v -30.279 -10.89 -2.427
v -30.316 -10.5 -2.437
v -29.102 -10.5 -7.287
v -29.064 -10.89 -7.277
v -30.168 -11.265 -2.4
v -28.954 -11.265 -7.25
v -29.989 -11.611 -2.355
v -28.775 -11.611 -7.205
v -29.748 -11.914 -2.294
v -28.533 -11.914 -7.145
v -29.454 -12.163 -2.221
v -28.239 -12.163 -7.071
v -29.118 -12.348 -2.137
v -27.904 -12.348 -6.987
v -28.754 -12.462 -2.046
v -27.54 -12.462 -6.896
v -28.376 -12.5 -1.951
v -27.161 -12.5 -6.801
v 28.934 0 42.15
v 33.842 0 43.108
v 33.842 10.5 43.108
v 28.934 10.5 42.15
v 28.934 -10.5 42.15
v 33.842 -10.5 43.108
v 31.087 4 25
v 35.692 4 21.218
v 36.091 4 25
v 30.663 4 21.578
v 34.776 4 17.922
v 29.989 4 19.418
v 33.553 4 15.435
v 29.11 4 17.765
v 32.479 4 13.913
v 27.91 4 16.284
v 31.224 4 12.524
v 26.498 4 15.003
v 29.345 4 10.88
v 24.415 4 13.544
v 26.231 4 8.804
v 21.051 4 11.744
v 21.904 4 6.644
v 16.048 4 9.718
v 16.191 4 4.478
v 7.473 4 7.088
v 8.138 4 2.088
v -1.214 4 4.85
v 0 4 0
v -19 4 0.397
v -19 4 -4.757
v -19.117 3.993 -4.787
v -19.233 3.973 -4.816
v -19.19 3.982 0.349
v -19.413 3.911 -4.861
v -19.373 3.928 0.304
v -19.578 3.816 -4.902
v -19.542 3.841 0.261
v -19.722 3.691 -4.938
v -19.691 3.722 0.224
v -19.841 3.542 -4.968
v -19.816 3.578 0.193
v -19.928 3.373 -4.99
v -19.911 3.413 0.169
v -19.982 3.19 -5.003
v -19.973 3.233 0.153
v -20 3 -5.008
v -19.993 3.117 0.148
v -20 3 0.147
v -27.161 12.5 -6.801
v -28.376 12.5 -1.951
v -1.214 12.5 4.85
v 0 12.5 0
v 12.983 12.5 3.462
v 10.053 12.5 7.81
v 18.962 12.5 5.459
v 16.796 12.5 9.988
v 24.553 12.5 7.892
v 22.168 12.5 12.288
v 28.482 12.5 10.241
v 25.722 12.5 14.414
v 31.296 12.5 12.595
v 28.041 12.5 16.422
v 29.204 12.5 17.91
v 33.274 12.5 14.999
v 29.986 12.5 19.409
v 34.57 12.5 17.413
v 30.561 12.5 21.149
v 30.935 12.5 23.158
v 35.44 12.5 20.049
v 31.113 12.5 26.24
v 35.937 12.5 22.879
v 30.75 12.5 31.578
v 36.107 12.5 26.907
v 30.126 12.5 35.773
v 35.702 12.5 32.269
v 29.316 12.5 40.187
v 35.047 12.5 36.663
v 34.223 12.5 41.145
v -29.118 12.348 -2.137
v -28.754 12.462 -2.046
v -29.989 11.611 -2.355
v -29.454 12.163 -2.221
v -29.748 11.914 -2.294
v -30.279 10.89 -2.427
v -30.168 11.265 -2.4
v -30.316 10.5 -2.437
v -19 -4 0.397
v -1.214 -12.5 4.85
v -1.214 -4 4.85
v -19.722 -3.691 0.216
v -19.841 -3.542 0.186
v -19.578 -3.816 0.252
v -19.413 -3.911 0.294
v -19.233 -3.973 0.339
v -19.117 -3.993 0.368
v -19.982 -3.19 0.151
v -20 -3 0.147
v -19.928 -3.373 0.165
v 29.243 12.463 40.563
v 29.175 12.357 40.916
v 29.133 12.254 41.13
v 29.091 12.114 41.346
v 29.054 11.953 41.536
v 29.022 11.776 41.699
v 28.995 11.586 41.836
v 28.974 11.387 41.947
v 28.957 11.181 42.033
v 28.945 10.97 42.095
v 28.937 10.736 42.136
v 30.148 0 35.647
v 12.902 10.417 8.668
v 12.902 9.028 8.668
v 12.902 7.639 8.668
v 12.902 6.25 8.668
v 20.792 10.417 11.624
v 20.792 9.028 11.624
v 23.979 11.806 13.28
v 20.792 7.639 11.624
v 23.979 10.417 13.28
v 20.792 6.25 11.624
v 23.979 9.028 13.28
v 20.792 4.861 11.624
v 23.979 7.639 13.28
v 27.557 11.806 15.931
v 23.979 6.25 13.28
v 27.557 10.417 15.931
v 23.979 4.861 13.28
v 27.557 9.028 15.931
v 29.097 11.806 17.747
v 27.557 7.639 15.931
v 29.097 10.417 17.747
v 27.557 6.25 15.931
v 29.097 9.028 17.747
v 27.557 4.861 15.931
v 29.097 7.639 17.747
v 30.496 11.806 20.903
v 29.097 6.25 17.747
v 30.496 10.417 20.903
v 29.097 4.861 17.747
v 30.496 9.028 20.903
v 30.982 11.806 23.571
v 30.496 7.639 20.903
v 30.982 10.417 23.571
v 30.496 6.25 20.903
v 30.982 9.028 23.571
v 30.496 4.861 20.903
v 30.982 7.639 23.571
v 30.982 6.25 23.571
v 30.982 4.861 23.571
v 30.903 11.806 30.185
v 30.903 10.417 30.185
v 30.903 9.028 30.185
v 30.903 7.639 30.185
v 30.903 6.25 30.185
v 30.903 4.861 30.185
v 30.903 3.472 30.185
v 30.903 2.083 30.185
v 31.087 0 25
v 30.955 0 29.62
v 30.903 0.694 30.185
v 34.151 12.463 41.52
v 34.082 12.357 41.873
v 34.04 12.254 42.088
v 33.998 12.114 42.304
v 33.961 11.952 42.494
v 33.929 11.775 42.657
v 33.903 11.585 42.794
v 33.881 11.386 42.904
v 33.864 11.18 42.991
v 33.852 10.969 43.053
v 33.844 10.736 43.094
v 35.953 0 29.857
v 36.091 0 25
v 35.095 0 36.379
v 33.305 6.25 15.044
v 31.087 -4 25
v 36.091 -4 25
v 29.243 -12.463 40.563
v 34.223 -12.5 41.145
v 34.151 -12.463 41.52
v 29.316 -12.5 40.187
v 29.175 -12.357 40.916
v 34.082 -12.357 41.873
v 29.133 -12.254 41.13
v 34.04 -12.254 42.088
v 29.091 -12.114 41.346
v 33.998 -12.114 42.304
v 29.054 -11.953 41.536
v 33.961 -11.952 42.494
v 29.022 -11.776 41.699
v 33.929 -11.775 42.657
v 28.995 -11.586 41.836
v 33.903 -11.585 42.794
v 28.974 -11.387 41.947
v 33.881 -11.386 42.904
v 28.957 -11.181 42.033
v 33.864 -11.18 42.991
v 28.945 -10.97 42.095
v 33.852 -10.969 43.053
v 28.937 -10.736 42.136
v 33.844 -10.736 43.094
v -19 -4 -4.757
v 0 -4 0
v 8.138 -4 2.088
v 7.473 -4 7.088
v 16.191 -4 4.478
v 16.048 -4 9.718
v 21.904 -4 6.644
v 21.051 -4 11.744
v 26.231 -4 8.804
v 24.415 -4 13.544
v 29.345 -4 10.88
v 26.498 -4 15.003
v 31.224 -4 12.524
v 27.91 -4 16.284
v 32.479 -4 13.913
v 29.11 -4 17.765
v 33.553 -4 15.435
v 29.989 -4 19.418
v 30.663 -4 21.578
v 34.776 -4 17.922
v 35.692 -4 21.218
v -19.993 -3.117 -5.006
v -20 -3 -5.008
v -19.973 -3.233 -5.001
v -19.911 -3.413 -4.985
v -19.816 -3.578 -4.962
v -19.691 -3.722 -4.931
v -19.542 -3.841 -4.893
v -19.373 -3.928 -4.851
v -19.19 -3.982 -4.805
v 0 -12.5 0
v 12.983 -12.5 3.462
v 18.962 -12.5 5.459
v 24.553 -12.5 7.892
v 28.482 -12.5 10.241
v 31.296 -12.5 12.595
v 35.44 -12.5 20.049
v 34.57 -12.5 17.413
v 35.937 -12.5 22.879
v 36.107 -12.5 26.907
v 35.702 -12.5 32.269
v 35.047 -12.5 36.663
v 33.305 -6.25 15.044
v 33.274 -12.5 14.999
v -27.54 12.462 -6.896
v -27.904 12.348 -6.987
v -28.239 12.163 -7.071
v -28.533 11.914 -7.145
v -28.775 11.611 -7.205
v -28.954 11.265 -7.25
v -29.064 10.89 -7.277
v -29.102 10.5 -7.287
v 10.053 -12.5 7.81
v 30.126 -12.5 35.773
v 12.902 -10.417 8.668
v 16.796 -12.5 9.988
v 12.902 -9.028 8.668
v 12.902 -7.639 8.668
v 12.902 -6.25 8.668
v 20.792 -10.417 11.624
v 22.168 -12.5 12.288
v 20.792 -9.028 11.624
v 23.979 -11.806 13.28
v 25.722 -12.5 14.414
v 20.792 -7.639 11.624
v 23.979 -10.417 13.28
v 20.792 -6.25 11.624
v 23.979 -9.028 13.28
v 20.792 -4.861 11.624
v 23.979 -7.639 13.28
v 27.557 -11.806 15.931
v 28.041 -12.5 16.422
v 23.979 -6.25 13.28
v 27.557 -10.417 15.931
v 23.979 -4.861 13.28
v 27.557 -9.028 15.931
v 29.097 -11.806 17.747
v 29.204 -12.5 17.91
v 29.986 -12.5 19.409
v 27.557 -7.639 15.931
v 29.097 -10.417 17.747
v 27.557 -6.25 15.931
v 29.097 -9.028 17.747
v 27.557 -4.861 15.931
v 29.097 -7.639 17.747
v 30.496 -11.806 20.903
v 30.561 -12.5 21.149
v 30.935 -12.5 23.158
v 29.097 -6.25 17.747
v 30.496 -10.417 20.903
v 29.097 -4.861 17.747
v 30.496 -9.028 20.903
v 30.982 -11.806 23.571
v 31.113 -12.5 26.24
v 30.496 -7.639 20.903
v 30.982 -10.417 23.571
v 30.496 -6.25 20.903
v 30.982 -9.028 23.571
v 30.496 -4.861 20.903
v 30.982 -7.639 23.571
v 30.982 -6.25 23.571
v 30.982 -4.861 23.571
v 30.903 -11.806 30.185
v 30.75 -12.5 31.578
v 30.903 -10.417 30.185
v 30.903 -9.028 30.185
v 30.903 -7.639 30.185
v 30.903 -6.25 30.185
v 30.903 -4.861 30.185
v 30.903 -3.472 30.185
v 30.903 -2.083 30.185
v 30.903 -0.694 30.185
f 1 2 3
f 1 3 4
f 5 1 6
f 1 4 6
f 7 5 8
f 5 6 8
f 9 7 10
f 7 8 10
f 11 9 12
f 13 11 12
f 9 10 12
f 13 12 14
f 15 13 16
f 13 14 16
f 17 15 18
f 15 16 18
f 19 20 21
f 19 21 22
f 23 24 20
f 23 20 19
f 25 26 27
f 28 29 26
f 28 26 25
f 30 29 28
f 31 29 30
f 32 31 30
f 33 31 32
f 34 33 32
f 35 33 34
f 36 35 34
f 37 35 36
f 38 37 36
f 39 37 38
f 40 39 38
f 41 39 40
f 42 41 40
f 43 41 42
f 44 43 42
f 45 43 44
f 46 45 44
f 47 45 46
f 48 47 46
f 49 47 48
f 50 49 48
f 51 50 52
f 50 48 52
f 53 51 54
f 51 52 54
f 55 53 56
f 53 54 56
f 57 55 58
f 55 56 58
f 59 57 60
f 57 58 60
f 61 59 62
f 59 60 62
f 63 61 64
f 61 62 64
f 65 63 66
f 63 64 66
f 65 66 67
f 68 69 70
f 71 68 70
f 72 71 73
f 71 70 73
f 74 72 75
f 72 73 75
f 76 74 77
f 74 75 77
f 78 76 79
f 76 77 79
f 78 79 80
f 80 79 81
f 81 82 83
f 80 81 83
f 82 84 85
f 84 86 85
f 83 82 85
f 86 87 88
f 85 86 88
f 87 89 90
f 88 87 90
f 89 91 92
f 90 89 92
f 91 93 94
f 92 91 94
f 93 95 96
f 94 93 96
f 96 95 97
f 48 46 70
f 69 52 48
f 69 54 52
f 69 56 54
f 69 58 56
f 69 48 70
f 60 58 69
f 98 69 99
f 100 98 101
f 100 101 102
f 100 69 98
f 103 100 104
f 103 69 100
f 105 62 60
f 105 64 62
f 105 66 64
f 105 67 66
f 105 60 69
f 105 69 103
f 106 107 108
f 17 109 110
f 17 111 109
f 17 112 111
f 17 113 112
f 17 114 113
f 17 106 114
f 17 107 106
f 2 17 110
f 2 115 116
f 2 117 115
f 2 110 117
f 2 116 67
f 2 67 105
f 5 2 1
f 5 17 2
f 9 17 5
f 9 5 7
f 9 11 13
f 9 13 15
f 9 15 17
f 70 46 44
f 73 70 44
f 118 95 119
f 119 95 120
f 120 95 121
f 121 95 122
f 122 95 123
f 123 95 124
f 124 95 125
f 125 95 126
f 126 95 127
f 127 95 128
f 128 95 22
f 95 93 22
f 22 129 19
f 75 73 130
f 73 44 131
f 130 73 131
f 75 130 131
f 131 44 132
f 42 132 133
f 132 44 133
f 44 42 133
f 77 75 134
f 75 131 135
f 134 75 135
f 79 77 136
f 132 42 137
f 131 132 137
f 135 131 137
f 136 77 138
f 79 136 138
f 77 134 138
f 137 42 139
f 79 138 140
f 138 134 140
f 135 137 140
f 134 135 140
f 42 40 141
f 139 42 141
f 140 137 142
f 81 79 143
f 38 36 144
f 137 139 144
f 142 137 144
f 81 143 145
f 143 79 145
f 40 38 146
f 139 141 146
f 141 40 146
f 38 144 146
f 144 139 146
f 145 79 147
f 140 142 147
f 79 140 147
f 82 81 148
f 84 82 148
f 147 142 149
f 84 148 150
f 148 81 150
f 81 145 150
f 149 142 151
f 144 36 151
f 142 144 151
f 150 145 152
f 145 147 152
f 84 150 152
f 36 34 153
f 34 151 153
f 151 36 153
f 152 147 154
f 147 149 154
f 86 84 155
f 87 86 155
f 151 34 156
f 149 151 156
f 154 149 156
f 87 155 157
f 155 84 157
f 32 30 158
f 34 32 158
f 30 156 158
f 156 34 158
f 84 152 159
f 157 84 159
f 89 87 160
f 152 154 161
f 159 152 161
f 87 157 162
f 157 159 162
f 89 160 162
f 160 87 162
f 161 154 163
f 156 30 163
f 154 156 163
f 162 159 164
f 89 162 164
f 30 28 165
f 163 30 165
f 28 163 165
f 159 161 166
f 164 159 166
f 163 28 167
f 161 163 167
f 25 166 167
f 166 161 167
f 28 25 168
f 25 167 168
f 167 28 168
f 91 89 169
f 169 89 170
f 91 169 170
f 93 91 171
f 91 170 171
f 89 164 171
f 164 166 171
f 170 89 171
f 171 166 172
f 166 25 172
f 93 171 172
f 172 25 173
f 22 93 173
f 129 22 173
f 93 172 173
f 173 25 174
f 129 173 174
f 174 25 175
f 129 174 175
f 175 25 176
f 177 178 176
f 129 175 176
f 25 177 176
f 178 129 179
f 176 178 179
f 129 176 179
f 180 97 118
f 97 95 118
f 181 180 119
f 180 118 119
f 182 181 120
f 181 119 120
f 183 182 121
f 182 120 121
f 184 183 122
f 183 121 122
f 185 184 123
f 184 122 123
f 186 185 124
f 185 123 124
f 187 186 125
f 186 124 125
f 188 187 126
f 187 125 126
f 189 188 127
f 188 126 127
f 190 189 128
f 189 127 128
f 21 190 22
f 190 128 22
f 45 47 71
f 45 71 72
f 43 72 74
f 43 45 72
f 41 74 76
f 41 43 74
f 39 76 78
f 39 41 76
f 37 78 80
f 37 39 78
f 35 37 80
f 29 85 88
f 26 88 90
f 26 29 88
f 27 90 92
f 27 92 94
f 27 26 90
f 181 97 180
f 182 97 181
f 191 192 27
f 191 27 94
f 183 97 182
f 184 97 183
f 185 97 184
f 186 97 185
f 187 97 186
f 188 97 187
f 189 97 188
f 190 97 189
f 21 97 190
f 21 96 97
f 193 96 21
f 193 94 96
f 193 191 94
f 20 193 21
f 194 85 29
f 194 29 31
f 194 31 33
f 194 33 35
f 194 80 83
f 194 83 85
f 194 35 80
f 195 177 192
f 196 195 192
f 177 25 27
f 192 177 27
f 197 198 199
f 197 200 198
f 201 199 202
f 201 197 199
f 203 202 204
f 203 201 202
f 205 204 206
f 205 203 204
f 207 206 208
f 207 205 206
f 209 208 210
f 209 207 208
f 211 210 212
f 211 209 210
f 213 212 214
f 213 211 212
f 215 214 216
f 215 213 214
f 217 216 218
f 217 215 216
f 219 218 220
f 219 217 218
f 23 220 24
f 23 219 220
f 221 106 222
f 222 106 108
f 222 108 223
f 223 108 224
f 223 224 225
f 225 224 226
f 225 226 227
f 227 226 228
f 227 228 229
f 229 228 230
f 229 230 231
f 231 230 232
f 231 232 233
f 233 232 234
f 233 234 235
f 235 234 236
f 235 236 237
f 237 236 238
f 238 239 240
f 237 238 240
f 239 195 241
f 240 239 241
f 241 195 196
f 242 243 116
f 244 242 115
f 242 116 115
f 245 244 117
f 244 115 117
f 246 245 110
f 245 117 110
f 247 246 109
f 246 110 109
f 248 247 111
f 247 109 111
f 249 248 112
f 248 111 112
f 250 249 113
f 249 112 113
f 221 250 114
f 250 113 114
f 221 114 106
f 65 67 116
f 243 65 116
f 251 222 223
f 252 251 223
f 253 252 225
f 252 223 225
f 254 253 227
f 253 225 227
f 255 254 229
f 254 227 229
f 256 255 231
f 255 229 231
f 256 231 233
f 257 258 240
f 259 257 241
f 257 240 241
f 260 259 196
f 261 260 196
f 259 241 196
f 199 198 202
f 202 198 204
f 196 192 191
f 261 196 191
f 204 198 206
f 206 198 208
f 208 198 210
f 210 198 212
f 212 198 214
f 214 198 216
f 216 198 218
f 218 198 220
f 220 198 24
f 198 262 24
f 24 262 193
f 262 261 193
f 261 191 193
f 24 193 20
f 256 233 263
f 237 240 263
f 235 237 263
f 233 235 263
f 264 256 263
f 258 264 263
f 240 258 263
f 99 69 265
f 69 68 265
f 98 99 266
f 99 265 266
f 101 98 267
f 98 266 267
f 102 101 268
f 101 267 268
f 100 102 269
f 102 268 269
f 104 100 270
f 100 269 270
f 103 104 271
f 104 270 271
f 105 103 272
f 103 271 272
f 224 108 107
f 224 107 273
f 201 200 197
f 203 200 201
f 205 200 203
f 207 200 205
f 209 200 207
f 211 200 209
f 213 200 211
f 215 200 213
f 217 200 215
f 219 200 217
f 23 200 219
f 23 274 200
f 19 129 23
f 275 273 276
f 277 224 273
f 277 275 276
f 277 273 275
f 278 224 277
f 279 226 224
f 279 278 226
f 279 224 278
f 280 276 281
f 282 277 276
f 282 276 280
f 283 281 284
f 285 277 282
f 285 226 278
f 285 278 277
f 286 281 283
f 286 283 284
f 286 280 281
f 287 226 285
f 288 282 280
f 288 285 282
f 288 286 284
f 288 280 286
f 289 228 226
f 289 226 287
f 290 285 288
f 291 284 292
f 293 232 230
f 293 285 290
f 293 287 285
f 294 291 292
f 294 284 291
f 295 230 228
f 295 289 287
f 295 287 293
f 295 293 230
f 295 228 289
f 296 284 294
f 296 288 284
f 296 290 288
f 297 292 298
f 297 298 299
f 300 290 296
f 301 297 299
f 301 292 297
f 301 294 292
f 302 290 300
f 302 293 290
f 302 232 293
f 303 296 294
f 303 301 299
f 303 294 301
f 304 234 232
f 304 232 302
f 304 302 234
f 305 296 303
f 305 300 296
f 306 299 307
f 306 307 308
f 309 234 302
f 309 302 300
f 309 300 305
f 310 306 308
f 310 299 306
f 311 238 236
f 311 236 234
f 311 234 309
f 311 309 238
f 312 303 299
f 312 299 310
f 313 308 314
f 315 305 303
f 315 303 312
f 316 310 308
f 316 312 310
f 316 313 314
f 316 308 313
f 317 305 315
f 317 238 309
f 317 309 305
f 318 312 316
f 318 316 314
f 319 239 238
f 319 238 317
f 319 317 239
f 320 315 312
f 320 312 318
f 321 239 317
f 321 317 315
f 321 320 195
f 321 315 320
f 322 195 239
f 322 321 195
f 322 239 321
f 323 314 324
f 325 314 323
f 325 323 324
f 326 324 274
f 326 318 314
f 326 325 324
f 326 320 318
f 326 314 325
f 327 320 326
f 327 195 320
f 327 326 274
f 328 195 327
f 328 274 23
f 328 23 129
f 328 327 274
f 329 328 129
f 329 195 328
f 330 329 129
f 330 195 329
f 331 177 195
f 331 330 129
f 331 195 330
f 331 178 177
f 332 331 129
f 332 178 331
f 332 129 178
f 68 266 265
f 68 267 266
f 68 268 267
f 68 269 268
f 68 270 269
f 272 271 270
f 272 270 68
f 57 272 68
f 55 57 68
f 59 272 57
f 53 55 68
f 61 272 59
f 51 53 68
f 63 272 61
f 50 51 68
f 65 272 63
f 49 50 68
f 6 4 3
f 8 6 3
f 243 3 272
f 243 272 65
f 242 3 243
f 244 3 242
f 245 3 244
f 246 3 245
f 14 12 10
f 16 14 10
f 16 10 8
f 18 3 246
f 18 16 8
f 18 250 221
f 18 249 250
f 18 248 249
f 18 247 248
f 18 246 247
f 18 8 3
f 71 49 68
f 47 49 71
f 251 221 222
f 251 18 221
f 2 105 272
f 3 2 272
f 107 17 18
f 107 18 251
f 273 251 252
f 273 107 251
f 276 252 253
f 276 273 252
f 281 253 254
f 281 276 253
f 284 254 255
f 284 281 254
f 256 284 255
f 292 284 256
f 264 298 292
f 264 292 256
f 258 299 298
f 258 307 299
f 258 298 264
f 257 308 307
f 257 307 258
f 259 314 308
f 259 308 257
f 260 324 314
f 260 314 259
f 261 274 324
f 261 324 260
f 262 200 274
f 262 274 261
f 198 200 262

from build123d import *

# Parameters (mm, degrees)
F1_DEPTH      = 12.5
F1_DEPTH_BACK = 12.5
F2_R          = 2
F4_DEPTH      = 25
F4_DEPTH_BACK = 25


# Not quite as in the source:
# - the dataset's text gives a spline's control points without its knots; the knots are read off the source's solid


with BuildPart() as f1:
    # F0 (on Front) → F1 (new body, two sides)
    with BuildSketch(Plane.XZ) as f1_sk:
        with BuildLine():
            Line((-1.2144668808, 4.8502649614), (0, 0))
            add(Edge.make_bspline(
                [(0, 0), (14.0053337055, 3.5068216017), (40.2847665376, 10.0869812236), (35.8928594477, 32.5950939434), (33.8415652514, 43.1077592075)],
                knots=[0, 0, 0, 0, 0.5329389288, 1, 1, 1, 1], degree=3))
            Line((33.8415652514, 43.1077592075), (28.9341160149, 42.1501883266))
            add(Edge.make_bspline(
                [(-1.2144668808, 4.8502649614), (2.0704623451, 5.6727845108), (6.9395130075, 6.8930060669), (12.9580209, 8.6517206422), (17.1378010676, 10.0677938672), (20.8819548221, 11.6030918314), (24.0858702772, 13.2626270815), (26.223316492, 14.7303860036), (27.5858152583, 15.9298585553), (28.2940402512, 16.6843045519), (28.7790865507, 17.2904800643), (29.1028323995, 17.7454757687), (29.3927734629, 18.2085550663), (29.9263537911, 19.1820206107), (30.5546444399, 20.8222293139), (31.0433856174, 23.4947469816), (31.1666131935, 26.6257001867), (30.9497019112, 30.1362027001), (30.2857972333, 35.2092298808), (29.4831057596, 39.3366740929), (28.9341160149, 42.1501883266)],
                knots=[0, 0, 0, 0, 0.125, 0.1875, 0.25, 0.3125, 0.375, 0.4375, 0.46875, 0.5, 0.515625, 0.53125, 0.546875, 0.5625, 0.625, 0.6875, 0.75, 0.8125, 0.875, 1, 1, 1, 1], degree=3))
        make_face()
        Polygon((-29.1015897681, -7.286801285), (0, 0), (-1.2144668808, 4.8502649614), (-30.316056649, -2.4365363237), align=None)
    extrude(amount=F1_DEPTH)
    extrude(f1_sk.sketch, amount=-F1_DEPTH_BACK)

    # F2
    f2_edges = [f1.edges().sort_by_distance(p)[0] for p in [
        (31.387841, -12.5, 42.628974),
        (31.387841, 12.5, 42.628974),
        (-29.708823, -12.5, -4.861669),
        (-29.708823, 12.5, -4.861669),
    ]]
    fillet(f2_edges, radius=F2_R)

    # F3 (on Top) → F4 (cut, two sides)
    with BuildSketch(Plane.XY) as f4_sk:
        with BuildLine():
            Line((-19, -4), (50, -4))
            Line((50, -4), (50, 4))
            Line((50, 4), (-19, 4))
            ThreePointArc((-19, 4), (-19.7071067812, 3.7071067812), (-20, 3))
            Line((-20, 3), (-20, -3))
            ThreePointArc((-20, -3), (-19.7071067812, -3.7071067812), (-19, -4))
        make_face()
    extrude(amount=F4_DEPTH, mode=Mode.SUBTRACT)
    extrude(f4_sk.sketch, amount=-F4_DEPTH_BACK, mode=Mode.SUBTRACT)


solid = f1.part
